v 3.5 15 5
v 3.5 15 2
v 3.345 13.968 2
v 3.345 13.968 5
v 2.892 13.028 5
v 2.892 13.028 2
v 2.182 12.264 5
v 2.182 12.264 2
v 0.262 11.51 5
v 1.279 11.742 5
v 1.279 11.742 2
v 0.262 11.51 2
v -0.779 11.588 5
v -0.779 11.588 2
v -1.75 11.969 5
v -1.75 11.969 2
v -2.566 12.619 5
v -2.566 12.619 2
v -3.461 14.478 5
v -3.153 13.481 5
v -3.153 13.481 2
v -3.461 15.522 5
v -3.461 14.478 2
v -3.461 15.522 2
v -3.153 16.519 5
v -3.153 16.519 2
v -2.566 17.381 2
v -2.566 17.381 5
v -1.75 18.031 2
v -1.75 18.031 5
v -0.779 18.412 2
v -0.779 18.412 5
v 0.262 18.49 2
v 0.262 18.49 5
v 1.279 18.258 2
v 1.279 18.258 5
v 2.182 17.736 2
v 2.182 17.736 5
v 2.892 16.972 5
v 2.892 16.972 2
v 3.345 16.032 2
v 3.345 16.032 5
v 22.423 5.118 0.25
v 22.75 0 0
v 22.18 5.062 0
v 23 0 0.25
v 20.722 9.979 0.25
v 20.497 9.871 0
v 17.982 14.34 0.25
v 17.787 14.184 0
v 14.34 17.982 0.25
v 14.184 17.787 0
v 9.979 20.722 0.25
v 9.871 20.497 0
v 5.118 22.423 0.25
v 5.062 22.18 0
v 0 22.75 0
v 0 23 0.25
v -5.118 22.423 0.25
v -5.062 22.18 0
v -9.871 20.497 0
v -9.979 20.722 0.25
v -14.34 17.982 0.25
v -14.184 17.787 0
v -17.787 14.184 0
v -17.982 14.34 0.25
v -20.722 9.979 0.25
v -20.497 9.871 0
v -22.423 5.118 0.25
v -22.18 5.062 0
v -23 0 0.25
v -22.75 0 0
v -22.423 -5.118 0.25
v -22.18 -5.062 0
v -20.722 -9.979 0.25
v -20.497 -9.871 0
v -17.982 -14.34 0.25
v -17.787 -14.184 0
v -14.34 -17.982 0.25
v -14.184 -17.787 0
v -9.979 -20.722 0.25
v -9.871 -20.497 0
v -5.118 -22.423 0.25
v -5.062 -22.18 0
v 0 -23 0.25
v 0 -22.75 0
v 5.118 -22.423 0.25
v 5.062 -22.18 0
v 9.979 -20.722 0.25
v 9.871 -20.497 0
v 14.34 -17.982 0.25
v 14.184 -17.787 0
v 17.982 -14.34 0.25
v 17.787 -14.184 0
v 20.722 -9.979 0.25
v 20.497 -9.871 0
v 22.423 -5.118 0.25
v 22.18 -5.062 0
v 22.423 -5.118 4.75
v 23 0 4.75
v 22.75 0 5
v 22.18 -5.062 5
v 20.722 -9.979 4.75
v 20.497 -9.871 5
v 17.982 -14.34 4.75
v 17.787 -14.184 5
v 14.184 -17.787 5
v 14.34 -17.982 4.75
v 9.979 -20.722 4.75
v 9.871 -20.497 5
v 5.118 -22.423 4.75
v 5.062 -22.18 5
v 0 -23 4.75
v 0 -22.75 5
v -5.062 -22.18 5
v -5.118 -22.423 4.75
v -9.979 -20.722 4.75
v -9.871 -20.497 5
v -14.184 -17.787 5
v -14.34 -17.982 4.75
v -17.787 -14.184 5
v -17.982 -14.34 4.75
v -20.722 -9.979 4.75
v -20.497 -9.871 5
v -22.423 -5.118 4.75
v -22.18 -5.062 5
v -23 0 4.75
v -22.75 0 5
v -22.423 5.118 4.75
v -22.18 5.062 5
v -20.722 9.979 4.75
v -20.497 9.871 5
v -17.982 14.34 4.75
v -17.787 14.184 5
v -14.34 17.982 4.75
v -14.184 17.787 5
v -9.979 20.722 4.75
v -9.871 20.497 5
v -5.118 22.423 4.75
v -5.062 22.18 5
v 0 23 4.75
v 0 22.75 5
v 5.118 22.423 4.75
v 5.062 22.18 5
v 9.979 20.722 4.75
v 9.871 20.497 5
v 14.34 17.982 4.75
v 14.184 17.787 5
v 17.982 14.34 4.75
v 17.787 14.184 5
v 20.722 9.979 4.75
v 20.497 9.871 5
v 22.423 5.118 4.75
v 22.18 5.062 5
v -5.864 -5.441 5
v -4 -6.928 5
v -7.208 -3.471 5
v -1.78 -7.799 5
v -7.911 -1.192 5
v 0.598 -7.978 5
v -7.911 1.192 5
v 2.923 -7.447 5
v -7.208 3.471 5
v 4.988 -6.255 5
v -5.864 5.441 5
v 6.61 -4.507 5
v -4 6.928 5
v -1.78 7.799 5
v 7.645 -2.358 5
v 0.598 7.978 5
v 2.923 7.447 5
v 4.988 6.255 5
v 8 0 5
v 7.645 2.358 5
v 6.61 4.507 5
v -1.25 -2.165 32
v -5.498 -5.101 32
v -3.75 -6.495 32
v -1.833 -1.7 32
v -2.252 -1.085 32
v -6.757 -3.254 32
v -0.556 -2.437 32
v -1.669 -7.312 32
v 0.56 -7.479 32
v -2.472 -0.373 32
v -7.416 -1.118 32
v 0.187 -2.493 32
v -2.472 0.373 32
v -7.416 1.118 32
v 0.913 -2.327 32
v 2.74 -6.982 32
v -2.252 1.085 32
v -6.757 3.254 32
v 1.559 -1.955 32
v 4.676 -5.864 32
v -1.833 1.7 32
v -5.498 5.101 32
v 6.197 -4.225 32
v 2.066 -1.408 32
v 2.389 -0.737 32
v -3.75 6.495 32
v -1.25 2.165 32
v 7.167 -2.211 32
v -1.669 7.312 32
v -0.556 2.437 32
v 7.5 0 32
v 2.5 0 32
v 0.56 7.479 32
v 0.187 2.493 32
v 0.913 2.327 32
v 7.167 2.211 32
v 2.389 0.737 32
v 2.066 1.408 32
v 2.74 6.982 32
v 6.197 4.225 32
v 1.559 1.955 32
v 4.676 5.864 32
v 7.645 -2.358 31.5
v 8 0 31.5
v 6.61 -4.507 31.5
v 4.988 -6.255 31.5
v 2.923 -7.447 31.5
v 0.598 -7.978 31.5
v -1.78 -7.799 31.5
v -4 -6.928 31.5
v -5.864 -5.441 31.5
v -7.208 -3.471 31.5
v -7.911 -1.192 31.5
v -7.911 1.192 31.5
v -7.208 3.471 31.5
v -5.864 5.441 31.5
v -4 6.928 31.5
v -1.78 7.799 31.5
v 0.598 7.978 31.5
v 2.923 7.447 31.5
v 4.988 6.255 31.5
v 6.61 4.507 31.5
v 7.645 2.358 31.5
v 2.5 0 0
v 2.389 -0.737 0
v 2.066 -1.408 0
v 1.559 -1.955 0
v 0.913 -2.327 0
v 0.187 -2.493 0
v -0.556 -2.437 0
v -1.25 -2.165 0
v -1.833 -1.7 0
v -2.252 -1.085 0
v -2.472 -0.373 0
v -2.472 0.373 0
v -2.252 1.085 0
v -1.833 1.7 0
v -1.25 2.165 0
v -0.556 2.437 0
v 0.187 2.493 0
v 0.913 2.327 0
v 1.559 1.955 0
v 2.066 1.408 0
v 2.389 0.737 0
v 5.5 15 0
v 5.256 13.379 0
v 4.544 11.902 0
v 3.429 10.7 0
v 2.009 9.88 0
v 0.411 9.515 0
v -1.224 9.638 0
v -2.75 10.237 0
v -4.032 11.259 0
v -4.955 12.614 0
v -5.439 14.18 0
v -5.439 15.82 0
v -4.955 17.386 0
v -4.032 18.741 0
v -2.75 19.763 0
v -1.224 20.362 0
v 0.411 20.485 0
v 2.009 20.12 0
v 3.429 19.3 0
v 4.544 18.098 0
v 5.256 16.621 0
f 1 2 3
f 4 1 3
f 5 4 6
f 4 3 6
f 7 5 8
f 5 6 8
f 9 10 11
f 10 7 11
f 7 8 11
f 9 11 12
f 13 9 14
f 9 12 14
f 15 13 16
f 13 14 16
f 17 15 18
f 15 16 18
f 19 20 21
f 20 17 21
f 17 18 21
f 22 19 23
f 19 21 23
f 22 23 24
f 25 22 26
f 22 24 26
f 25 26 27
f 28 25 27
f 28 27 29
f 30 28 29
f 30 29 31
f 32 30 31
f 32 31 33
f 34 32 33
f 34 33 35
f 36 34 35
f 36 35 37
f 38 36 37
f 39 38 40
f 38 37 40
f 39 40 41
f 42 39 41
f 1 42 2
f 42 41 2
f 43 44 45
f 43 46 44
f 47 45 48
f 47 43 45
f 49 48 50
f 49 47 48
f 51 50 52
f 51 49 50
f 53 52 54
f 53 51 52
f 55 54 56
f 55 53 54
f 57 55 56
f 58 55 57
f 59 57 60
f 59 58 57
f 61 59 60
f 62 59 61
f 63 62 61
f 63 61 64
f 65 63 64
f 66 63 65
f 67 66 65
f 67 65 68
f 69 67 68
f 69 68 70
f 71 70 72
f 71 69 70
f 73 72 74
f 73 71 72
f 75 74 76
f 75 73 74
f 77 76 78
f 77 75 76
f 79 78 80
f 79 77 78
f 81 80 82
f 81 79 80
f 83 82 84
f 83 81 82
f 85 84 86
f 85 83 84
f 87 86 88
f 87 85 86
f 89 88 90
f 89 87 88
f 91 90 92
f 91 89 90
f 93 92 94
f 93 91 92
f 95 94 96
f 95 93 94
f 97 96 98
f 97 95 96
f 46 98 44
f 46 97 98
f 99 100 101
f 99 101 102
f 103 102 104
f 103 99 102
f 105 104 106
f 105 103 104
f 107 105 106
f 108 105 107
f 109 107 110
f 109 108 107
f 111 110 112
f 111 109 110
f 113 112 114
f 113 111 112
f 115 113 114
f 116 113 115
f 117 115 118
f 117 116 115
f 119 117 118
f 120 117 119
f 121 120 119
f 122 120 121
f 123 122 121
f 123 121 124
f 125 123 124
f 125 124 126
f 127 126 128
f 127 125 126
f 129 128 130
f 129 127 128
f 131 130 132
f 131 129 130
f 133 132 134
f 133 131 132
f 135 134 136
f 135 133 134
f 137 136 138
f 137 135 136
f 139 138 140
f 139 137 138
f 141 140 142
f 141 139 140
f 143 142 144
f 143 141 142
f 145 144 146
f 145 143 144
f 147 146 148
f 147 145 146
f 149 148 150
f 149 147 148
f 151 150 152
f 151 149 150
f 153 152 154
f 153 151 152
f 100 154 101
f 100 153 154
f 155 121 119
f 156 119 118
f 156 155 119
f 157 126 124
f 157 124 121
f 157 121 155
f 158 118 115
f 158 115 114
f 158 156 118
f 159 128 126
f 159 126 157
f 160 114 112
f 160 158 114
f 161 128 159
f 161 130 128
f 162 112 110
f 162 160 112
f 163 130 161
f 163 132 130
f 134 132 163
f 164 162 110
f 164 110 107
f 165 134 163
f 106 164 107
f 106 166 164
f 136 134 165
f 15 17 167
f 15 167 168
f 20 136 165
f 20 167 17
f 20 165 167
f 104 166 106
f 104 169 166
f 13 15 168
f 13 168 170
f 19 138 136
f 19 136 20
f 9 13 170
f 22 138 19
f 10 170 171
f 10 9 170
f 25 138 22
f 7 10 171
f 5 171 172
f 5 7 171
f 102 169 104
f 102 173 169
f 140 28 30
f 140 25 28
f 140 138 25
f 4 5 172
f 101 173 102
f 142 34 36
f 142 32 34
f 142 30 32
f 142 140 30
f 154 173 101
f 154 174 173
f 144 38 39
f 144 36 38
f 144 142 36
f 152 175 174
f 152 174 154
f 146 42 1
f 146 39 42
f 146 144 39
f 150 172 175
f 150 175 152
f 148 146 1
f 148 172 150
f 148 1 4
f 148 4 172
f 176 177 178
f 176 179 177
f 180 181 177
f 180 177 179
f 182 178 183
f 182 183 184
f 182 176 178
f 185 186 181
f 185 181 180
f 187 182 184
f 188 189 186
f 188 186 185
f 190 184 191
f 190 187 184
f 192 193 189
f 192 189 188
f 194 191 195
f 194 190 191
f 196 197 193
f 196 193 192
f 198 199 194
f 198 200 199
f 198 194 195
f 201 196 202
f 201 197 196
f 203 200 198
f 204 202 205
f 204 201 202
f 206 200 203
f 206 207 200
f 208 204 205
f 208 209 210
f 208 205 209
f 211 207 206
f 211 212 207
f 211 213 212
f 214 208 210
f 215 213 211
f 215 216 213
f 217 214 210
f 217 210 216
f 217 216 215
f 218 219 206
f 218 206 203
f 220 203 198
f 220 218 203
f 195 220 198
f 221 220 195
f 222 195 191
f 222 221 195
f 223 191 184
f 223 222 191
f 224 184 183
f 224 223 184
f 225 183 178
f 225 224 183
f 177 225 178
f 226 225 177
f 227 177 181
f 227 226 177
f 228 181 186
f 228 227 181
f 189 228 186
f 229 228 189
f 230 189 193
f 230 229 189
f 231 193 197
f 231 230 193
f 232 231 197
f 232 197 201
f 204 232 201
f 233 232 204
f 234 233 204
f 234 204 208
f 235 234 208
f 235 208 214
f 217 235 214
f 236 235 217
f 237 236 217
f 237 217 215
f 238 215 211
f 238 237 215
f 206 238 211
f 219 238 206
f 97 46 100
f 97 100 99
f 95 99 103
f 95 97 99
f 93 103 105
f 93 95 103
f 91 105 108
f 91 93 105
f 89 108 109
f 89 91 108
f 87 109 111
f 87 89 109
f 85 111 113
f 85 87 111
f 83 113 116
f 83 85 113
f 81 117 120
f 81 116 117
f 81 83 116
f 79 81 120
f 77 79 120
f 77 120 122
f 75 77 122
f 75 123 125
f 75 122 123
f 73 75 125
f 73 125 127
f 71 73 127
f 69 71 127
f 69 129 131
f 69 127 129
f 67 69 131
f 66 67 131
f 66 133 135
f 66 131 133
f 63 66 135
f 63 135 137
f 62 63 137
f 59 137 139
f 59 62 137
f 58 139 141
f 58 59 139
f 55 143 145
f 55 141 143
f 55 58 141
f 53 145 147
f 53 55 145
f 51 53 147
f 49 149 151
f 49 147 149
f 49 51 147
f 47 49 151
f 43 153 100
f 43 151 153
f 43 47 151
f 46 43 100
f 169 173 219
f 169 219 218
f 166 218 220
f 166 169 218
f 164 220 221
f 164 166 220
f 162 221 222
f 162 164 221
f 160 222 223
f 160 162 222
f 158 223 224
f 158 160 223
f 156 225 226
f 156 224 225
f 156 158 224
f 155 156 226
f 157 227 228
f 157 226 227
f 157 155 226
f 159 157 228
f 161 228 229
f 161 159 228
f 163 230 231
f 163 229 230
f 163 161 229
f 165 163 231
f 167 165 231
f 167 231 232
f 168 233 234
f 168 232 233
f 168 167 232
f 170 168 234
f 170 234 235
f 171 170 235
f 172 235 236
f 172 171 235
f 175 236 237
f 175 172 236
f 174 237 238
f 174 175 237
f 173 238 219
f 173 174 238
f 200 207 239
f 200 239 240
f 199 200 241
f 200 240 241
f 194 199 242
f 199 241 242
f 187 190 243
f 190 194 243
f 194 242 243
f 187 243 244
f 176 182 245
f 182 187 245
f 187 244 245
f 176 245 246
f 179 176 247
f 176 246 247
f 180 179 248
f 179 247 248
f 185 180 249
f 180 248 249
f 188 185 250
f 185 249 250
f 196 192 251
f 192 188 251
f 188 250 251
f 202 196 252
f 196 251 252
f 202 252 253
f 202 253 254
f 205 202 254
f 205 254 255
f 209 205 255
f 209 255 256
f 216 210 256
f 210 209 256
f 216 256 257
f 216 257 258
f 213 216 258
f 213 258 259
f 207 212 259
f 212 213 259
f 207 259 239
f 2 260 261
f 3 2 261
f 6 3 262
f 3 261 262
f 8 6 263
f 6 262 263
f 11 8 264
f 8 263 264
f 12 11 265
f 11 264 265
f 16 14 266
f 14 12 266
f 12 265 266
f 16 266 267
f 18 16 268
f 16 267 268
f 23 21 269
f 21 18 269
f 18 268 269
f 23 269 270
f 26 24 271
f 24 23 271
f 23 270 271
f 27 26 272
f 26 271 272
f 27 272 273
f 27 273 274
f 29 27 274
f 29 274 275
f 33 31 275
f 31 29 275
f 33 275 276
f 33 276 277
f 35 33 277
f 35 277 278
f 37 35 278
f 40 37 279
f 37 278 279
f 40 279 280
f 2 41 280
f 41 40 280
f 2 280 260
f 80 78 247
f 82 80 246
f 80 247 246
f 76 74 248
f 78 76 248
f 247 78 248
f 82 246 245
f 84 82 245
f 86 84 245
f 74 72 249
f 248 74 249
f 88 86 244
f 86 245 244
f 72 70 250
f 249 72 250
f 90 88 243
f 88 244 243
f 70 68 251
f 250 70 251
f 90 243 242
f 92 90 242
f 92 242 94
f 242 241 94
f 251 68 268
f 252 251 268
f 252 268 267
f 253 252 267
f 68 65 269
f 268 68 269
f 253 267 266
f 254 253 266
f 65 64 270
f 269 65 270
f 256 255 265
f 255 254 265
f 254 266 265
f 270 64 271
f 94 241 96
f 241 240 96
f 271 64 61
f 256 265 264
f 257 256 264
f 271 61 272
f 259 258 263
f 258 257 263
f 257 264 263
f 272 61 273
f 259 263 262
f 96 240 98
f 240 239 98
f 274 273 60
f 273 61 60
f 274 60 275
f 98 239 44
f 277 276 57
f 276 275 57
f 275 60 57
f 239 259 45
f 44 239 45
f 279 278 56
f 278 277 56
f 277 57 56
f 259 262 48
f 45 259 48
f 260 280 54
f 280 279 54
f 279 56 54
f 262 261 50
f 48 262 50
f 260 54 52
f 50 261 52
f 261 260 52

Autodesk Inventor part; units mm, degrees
ref_plane "YZ Plane" through (0, 0, 0) normal (1, 0, 0) x (0, 1, 0)
ref_plane "XZ Plane" through (0, 0, 0) normal (0, 1, 0) x (-1, 0, 0)
ref_plane "XY Plane" through (0, 0, 0) normal (0, 0, 1) x (1, 0, 0)
sketch "Sketch1" plane through (0, 0, 0) normal (0, 0, 1) x (1, 0, 0)
  circle A0 centre (0, 0) radius 23
  circle A1 centre (0, 0) radius 8
  circle A2 centre (0, 0) radius 2.5
  circle A3 centre (0, 15) radius 3.5
  dimension "d0" = 46
  dimension "d1" = 16
  dimension "d2" = 5
  dimension "d3" = 7
  dimension "d4" = 15
extrude "Extrusion1" add sketch "Sketch1" along normal blind 5 contours A0
extrude "Extrusion2" add sketch "Sketch1" along normal blind 32 contours A1
chamfer "Chamfer1" distance 0.5 angle 45 1 edges at (-8, 0, 32)
chamfer "Chamfer2" distance 0.25 angle 45 2 edges at (-23, 0, 5) (-23, 0, 0)
chamfer "Chamfer3" distance 2 angle 45 1 edges at (-3.5, 15, 0)
properties part number "CylinderCover"
